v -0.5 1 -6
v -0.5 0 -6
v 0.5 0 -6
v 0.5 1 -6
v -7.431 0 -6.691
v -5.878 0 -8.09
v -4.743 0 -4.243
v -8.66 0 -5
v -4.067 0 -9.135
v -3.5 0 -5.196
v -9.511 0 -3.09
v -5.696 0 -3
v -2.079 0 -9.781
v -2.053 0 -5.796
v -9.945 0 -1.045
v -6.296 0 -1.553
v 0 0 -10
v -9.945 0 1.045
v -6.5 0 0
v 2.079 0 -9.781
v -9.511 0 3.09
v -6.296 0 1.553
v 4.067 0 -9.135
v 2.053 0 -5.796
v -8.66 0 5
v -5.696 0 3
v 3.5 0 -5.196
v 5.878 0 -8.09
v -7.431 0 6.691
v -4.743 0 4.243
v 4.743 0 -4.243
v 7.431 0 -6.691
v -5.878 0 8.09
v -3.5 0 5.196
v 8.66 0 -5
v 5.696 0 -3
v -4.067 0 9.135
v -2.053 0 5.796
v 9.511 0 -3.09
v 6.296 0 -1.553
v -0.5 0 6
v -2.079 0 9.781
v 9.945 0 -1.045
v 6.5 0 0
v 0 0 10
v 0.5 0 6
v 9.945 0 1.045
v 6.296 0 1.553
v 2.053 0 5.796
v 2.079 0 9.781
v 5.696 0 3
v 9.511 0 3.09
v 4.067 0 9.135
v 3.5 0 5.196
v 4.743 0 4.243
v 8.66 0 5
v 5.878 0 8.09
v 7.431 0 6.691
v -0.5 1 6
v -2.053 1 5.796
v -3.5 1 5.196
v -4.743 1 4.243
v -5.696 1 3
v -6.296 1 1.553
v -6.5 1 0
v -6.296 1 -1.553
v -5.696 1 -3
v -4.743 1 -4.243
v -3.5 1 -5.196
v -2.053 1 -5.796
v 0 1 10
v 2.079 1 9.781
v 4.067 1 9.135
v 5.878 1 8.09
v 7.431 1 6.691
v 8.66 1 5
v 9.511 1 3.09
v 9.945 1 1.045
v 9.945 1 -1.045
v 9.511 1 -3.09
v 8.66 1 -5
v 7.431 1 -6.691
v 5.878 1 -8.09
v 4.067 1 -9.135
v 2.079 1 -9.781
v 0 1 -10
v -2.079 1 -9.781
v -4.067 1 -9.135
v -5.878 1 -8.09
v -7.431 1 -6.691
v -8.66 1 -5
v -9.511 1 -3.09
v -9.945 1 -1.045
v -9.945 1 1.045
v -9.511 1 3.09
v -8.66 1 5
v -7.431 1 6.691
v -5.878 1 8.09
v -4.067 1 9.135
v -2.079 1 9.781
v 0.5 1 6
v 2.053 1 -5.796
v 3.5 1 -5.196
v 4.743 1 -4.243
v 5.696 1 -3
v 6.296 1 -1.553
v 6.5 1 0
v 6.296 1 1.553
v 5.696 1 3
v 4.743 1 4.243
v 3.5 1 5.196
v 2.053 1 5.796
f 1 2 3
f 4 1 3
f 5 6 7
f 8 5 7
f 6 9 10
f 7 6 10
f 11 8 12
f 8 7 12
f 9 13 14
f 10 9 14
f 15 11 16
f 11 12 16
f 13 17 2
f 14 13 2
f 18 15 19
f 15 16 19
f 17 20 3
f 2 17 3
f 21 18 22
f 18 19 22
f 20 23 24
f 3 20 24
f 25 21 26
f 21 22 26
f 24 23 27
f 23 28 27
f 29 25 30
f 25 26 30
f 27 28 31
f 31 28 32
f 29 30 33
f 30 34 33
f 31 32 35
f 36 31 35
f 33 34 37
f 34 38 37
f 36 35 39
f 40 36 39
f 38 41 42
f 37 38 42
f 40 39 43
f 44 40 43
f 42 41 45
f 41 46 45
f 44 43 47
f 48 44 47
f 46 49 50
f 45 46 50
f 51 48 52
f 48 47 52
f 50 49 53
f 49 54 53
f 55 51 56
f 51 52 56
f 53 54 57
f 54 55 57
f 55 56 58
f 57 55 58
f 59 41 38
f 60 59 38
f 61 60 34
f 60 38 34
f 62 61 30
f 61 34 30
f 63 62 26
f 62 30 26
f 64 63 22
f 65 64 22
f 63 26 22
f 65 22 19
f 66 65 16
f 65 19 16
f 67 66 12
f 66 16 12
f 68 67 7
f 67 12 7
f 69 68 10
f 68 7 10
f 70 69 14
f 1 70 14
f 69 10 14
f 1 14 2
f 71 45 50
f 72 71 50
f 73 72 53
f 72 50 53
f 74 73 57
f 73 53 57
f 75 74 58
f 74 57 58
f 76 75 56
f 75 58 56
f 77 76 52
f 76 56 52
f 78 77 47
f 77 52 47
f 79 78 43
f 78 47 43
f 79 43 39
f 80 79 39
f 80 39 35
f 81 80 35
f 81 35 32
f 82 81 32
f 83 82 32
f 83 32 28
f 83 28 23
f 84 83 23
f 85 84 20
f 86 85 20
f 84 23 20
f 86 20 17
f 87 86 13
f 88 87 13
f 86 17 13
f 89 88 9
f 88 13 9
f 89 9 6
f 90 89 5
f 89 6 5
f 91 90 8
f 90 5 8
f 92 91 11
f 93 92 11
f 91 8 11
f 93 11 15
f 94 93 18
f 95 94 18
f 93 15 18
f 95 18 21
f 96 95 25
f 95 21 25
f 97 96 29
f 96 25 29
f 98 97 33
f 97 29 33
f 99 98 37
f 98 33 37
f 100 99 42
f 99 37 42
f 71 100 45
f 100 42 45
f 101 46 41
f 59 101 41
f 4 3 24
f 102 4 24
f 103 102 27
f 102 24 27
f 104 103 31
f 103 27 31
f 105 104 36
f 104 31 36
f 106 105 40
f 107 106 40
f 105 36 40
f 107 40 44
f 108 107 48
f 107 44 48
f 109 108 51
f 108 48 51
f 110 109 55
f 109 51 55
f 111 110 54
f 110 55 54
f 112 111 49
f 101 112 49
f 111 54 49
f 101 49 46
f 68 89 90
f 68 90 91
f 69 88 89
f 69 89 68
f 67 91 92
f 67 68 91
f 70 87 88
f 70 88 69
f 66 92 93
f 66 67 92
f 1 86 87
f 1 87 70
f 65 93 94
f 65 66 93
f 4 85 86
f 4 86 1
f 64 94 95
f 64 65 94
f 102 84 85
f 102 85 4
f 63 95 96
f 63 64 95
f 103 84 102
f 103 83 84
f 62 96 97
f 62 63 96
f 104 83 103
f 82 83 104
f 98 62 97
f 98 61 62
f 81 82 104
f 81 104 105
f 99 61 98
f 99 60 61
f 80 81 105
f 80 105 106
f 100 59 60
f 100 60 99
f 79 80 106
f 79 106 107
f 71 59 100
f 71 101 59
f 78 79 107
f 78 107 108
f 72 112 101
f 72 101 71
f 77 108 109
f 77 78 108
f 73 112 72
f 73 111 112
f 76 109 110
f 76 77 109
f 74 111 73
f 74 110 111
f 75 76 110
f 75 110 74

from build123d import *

# Parameters (mm, degrees)
SKETCH1_R           = 10
BOSS_EXTRUDE1_DEPTH = 1


with BuildPart() as part:
    # Sketch1 → Boss-Extrude1 (new body)
    with BuildSketch(Plane(origin=(0, 0, 0), x_dir=(1, 0, 0), z_dir=(0, 1, 0))):
        with Locations(Location((0, 0, 0), (0, 0, 270))):
            Circle(SKETCH1_R)
        with BuildLine():
            Line((-0.5, 6), (0.5, 6))
            ThreePointArc((0.5, 6), (6.5, 0), (0.5, -6))
            Line((0.5, -6), (-0.5, -6))
            ThreePointArc((-0.5, -6), (-6.5, 0), (-0.5, 6))
        make_face(mode=Mode.SUBTRACT)
    extrude(amount=BOSS_EXTRUDE1_DEPTH)


solid = part.part
